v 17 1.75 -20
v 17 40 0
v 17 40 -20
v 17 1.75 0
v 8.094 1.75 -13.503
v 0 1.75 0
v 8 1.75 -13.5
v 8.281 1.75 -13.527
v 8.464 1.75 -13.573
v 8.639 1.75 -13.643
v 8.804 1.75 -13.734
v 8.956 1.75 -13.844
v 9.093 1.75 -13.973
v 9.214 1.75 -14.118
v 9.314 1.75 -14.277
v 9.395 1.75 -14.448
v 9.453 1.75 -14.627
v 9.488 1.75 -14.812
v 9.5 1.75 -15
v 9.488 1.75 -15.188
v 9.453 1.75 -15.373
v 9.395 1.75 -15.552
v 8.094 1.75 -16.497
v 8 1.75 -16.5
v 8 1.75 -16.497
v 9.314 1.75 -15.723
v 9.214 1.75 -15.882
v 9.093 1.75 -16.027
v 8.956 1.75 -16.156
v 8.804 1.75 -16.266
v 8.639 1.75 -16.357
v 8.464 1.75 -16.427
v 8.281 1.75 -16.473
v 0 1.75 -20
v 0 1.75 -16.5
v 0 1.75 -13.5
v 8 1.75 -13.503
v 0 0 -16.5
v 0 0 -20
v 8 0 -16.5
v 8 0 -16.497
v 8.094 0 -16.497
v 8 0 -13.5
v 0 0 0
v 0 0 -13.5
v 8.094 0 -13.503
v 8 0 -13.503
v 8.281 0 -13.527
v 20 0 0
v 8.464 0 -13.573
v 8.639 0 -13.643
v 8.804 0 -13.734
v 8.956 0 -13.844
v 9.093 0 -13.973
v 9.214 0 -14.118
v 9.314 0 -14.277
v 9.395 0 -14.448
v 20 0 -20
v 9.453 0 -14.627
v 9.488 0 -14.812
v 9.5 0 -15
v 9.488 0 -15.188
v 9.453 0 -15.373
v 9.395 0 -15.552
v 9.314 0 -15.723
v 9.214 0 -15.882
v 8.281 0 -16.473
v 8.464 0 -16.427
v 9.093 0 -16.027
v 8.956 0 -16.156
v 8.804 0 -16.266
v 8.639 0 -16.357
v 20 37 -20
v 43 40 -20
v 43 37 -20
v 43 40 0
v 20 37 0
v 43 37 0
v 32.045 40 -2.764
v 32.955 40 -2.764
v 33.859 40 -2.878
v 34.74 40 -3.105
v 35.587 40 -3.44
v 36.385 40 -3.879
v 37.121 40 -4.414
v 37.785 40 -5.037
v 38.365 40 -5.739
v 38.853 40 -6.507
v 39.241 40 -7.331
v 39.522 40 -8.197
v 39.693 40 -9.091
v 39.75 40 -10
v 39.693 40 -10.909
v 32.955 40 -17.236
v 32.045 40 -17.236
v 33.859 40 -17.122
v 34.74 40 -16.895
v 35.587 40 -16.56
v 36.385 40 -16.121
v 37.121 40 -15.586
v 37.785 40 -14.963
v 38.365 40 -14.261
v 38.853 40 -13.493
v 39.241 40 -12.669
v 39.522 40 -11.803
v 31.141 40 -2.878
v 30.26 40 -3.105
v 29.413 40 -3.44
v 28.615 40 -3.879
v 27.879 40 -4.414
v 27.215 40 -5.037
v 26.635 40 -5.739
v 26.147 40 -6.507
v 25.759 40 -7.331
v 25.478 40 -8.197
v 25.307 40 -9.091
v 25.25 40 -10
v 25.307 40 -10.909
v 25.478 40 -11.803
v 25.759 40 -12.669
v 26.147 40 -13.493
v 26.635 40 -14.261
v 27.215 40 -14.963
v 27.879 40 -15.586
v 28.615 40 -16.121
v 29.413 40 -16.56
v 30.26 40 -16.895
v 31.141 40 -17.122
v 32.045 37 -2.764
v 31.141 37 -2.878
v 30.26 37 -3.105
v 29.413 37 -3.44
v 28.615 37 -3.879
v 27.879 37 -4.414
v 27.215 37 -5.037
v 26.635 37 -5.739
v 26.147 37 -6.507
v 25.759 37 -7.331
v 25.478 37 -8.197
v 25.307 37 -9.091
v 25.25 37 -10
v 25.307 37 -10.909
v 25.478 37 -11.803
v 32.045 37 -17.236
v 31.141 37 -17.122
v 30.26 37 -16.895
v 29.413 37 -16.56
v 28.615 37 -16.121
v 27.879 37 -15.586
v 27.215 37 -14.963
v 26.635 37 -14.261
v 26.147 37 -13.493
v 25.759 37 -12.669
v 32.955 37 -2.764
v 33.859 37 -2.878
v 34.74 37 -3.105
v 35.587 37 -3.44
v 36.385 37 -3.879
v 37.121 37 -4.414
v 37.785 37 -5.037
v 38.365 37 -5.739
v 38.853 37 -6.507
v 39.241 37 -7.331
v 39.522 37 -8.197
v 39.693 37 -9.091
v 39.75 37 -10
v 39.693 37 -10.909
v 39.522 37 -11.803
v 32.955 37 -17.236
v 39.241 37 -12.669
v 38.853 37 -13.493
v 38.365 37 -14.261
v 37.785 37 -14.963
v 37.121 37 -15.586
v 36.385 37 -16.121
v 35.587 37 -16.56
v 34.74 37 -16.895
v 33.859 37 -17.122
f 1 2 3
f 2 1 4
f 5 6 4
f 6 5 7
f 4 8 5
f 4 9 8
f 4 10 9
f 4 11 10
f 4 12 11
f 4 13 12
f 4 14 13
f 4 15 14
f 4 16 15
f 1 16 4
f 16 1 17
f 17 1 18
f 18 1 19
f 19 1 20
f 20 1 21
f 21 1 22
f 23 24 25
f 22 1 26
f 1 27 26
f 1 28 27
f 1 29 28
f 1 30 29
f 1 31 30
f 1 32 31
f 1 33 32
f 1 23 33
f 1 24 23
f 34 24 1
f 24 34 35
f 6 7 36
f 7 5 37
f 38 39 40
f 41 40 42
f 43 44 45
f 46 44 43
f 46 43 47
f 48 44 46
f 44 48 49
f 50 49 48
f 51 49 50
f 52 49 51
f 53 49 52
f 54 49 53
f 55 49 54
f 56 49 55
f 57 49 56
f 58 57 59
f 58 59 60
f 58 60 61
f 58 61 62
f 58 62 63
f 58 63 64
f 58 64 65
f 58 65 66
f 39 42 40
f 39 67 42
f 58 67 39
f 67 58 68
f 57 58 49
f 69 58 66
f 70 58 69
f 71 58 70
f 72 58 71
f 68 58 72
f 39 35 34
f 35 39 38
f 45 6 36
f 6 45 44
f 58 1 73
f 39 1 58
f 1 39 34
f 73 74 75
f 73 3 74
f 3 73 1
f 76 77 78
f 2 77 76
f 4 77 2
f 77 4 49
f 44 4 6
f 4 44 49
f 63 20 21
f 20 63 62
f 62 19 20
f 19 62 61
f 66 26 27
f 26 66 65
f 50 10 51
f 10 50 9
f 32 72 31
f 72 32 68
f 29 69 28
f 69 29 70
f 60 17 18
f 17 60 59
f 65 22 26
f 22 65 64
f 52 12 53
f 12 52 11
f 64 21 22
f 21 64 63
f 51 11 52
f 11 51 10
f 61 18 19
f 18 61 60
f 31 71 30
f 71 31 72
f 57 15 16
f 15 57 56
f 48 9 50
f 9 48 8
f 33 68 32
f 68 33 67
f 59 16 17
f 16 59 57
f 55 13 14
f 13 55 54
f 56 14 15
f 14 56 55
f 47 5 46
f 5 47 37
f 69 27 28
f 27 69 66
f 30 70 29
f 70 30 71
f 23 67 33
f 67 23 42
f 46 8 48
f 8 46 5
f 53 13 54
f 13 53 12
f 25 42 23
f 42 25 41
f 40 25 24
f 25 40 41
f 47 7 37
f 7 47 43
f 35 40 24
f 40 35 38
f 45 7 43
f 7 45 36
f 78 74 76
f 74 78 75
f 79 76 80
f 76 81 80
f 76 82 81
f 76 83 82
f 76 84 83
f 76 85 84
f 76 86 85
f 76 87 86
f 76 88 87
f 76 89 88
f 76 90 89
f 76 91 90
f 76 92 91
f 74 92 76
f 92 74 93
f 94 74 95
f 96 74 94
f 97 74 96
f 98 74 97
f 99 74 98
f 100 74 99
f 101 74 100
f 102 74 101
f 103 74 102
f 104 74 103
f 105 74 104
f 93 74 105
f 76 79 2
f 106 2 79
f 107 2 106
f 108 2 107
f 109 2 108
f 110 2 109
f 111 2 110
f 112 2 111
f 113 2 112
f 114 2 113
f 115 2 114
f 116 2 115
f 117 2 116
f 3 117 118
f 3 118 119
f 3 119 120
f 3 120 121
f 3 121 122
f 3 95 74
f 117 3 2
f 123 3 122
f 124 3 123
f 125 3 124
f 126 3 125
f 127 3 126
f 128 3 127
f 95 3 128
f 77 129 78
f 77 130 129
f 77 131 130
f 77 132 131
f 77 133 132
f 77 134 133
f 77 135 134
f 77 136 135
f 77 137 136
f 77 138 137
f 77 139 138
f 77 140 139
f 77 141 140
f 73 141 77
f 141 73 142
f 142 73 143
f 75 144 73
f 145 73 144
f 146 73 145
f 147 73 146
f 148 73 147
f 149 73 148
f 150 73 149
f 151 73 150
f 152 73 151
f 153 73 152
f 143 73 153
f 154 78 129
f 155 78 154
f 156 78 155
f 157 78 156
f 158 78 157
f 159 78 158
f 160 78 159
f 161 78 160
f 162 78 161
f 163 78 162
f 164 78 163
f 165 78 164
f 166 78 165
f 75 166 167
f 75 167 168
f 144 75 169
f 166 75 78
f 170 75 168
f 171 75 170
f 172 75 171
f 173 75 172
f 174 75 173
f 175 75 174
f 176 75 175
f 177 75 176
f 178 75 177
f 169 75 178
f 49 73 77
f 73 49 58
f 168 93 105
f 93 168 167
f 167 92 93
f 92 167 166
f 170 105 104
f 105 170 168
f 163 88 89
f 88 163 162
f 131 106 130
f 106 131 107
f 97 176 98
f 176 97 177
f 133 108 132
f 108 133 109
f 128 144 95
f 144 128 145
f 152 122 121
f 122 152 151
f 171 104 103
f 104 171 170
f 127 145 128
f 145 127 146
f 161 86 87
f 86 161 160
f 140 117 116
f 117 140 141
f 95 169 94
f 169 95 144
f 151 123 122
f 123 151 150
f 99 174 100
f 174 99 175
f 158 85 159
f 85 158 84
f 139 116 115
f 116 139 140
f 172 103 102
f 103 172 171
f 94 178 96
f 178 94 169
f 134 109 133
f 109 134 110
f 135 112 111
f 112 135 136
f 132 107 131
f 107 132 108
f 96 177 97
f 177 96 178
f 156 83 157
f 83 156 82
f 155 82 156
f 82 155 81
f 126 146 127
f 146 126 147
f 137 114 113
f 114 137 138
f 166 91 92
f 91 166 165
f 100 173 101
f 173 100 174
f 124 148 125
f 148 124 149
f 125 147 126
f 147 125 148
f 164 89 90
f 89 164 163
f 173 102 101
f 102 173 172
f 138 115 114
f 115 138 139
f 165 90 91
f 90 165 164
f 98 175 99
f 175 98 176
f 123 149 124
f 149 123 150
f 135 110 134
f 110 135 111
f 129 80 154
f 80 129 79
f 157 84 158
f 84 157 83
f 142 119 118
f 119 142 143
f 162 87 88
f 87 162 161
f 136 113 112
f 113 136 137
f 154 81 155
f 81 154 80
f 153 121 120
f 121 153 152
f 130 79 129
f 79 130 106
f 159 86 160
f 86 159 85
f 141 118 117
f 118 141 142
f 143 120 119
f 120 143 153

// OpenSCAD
$fn=50+0;
//Width of entire assembly
w=20;
// Length of lip (part with slot)
l3=17;
// Length of vertical
l2=40;
// Length of deck (part with sensor hole)
l1=23;
// Thickness of lip
t3=1.75;
// Thickness of vertical
t2=3;
// Thickness of deck
t1=3;
// radius of sensor hole
r1=7.25;
// radius of slot
r2=1.5;
// slot length (to center of arc)
sx=8;
// slot distance from edge
sy=5;
// sensor distance from edge (y)
dy=10;
// sensor distance from edge (x)
dx=12.5;

rotate([270,0,0])
union() {
difference() {
    // Lip
    cube([l3,w,t3]);
    translate([sx,w-sy,-1]) cylinder(r=r2,h=t3+2);  // round part of slot
    translate([0,w-sy-r2,-1]) cube([sx,r2*2,t3+2]);  // slot
}
// Vertical
translate([l3,0,0])
  cube([t2,w,l2]);

// Deck
translate([l3+t2,0,l2-(t1)])
  difference() {
     cube([l1,w,t1]);
      translate([dx,dy,-1]) cylinder(r=r1,h=t1+2);  // sensor hole
  }
}
